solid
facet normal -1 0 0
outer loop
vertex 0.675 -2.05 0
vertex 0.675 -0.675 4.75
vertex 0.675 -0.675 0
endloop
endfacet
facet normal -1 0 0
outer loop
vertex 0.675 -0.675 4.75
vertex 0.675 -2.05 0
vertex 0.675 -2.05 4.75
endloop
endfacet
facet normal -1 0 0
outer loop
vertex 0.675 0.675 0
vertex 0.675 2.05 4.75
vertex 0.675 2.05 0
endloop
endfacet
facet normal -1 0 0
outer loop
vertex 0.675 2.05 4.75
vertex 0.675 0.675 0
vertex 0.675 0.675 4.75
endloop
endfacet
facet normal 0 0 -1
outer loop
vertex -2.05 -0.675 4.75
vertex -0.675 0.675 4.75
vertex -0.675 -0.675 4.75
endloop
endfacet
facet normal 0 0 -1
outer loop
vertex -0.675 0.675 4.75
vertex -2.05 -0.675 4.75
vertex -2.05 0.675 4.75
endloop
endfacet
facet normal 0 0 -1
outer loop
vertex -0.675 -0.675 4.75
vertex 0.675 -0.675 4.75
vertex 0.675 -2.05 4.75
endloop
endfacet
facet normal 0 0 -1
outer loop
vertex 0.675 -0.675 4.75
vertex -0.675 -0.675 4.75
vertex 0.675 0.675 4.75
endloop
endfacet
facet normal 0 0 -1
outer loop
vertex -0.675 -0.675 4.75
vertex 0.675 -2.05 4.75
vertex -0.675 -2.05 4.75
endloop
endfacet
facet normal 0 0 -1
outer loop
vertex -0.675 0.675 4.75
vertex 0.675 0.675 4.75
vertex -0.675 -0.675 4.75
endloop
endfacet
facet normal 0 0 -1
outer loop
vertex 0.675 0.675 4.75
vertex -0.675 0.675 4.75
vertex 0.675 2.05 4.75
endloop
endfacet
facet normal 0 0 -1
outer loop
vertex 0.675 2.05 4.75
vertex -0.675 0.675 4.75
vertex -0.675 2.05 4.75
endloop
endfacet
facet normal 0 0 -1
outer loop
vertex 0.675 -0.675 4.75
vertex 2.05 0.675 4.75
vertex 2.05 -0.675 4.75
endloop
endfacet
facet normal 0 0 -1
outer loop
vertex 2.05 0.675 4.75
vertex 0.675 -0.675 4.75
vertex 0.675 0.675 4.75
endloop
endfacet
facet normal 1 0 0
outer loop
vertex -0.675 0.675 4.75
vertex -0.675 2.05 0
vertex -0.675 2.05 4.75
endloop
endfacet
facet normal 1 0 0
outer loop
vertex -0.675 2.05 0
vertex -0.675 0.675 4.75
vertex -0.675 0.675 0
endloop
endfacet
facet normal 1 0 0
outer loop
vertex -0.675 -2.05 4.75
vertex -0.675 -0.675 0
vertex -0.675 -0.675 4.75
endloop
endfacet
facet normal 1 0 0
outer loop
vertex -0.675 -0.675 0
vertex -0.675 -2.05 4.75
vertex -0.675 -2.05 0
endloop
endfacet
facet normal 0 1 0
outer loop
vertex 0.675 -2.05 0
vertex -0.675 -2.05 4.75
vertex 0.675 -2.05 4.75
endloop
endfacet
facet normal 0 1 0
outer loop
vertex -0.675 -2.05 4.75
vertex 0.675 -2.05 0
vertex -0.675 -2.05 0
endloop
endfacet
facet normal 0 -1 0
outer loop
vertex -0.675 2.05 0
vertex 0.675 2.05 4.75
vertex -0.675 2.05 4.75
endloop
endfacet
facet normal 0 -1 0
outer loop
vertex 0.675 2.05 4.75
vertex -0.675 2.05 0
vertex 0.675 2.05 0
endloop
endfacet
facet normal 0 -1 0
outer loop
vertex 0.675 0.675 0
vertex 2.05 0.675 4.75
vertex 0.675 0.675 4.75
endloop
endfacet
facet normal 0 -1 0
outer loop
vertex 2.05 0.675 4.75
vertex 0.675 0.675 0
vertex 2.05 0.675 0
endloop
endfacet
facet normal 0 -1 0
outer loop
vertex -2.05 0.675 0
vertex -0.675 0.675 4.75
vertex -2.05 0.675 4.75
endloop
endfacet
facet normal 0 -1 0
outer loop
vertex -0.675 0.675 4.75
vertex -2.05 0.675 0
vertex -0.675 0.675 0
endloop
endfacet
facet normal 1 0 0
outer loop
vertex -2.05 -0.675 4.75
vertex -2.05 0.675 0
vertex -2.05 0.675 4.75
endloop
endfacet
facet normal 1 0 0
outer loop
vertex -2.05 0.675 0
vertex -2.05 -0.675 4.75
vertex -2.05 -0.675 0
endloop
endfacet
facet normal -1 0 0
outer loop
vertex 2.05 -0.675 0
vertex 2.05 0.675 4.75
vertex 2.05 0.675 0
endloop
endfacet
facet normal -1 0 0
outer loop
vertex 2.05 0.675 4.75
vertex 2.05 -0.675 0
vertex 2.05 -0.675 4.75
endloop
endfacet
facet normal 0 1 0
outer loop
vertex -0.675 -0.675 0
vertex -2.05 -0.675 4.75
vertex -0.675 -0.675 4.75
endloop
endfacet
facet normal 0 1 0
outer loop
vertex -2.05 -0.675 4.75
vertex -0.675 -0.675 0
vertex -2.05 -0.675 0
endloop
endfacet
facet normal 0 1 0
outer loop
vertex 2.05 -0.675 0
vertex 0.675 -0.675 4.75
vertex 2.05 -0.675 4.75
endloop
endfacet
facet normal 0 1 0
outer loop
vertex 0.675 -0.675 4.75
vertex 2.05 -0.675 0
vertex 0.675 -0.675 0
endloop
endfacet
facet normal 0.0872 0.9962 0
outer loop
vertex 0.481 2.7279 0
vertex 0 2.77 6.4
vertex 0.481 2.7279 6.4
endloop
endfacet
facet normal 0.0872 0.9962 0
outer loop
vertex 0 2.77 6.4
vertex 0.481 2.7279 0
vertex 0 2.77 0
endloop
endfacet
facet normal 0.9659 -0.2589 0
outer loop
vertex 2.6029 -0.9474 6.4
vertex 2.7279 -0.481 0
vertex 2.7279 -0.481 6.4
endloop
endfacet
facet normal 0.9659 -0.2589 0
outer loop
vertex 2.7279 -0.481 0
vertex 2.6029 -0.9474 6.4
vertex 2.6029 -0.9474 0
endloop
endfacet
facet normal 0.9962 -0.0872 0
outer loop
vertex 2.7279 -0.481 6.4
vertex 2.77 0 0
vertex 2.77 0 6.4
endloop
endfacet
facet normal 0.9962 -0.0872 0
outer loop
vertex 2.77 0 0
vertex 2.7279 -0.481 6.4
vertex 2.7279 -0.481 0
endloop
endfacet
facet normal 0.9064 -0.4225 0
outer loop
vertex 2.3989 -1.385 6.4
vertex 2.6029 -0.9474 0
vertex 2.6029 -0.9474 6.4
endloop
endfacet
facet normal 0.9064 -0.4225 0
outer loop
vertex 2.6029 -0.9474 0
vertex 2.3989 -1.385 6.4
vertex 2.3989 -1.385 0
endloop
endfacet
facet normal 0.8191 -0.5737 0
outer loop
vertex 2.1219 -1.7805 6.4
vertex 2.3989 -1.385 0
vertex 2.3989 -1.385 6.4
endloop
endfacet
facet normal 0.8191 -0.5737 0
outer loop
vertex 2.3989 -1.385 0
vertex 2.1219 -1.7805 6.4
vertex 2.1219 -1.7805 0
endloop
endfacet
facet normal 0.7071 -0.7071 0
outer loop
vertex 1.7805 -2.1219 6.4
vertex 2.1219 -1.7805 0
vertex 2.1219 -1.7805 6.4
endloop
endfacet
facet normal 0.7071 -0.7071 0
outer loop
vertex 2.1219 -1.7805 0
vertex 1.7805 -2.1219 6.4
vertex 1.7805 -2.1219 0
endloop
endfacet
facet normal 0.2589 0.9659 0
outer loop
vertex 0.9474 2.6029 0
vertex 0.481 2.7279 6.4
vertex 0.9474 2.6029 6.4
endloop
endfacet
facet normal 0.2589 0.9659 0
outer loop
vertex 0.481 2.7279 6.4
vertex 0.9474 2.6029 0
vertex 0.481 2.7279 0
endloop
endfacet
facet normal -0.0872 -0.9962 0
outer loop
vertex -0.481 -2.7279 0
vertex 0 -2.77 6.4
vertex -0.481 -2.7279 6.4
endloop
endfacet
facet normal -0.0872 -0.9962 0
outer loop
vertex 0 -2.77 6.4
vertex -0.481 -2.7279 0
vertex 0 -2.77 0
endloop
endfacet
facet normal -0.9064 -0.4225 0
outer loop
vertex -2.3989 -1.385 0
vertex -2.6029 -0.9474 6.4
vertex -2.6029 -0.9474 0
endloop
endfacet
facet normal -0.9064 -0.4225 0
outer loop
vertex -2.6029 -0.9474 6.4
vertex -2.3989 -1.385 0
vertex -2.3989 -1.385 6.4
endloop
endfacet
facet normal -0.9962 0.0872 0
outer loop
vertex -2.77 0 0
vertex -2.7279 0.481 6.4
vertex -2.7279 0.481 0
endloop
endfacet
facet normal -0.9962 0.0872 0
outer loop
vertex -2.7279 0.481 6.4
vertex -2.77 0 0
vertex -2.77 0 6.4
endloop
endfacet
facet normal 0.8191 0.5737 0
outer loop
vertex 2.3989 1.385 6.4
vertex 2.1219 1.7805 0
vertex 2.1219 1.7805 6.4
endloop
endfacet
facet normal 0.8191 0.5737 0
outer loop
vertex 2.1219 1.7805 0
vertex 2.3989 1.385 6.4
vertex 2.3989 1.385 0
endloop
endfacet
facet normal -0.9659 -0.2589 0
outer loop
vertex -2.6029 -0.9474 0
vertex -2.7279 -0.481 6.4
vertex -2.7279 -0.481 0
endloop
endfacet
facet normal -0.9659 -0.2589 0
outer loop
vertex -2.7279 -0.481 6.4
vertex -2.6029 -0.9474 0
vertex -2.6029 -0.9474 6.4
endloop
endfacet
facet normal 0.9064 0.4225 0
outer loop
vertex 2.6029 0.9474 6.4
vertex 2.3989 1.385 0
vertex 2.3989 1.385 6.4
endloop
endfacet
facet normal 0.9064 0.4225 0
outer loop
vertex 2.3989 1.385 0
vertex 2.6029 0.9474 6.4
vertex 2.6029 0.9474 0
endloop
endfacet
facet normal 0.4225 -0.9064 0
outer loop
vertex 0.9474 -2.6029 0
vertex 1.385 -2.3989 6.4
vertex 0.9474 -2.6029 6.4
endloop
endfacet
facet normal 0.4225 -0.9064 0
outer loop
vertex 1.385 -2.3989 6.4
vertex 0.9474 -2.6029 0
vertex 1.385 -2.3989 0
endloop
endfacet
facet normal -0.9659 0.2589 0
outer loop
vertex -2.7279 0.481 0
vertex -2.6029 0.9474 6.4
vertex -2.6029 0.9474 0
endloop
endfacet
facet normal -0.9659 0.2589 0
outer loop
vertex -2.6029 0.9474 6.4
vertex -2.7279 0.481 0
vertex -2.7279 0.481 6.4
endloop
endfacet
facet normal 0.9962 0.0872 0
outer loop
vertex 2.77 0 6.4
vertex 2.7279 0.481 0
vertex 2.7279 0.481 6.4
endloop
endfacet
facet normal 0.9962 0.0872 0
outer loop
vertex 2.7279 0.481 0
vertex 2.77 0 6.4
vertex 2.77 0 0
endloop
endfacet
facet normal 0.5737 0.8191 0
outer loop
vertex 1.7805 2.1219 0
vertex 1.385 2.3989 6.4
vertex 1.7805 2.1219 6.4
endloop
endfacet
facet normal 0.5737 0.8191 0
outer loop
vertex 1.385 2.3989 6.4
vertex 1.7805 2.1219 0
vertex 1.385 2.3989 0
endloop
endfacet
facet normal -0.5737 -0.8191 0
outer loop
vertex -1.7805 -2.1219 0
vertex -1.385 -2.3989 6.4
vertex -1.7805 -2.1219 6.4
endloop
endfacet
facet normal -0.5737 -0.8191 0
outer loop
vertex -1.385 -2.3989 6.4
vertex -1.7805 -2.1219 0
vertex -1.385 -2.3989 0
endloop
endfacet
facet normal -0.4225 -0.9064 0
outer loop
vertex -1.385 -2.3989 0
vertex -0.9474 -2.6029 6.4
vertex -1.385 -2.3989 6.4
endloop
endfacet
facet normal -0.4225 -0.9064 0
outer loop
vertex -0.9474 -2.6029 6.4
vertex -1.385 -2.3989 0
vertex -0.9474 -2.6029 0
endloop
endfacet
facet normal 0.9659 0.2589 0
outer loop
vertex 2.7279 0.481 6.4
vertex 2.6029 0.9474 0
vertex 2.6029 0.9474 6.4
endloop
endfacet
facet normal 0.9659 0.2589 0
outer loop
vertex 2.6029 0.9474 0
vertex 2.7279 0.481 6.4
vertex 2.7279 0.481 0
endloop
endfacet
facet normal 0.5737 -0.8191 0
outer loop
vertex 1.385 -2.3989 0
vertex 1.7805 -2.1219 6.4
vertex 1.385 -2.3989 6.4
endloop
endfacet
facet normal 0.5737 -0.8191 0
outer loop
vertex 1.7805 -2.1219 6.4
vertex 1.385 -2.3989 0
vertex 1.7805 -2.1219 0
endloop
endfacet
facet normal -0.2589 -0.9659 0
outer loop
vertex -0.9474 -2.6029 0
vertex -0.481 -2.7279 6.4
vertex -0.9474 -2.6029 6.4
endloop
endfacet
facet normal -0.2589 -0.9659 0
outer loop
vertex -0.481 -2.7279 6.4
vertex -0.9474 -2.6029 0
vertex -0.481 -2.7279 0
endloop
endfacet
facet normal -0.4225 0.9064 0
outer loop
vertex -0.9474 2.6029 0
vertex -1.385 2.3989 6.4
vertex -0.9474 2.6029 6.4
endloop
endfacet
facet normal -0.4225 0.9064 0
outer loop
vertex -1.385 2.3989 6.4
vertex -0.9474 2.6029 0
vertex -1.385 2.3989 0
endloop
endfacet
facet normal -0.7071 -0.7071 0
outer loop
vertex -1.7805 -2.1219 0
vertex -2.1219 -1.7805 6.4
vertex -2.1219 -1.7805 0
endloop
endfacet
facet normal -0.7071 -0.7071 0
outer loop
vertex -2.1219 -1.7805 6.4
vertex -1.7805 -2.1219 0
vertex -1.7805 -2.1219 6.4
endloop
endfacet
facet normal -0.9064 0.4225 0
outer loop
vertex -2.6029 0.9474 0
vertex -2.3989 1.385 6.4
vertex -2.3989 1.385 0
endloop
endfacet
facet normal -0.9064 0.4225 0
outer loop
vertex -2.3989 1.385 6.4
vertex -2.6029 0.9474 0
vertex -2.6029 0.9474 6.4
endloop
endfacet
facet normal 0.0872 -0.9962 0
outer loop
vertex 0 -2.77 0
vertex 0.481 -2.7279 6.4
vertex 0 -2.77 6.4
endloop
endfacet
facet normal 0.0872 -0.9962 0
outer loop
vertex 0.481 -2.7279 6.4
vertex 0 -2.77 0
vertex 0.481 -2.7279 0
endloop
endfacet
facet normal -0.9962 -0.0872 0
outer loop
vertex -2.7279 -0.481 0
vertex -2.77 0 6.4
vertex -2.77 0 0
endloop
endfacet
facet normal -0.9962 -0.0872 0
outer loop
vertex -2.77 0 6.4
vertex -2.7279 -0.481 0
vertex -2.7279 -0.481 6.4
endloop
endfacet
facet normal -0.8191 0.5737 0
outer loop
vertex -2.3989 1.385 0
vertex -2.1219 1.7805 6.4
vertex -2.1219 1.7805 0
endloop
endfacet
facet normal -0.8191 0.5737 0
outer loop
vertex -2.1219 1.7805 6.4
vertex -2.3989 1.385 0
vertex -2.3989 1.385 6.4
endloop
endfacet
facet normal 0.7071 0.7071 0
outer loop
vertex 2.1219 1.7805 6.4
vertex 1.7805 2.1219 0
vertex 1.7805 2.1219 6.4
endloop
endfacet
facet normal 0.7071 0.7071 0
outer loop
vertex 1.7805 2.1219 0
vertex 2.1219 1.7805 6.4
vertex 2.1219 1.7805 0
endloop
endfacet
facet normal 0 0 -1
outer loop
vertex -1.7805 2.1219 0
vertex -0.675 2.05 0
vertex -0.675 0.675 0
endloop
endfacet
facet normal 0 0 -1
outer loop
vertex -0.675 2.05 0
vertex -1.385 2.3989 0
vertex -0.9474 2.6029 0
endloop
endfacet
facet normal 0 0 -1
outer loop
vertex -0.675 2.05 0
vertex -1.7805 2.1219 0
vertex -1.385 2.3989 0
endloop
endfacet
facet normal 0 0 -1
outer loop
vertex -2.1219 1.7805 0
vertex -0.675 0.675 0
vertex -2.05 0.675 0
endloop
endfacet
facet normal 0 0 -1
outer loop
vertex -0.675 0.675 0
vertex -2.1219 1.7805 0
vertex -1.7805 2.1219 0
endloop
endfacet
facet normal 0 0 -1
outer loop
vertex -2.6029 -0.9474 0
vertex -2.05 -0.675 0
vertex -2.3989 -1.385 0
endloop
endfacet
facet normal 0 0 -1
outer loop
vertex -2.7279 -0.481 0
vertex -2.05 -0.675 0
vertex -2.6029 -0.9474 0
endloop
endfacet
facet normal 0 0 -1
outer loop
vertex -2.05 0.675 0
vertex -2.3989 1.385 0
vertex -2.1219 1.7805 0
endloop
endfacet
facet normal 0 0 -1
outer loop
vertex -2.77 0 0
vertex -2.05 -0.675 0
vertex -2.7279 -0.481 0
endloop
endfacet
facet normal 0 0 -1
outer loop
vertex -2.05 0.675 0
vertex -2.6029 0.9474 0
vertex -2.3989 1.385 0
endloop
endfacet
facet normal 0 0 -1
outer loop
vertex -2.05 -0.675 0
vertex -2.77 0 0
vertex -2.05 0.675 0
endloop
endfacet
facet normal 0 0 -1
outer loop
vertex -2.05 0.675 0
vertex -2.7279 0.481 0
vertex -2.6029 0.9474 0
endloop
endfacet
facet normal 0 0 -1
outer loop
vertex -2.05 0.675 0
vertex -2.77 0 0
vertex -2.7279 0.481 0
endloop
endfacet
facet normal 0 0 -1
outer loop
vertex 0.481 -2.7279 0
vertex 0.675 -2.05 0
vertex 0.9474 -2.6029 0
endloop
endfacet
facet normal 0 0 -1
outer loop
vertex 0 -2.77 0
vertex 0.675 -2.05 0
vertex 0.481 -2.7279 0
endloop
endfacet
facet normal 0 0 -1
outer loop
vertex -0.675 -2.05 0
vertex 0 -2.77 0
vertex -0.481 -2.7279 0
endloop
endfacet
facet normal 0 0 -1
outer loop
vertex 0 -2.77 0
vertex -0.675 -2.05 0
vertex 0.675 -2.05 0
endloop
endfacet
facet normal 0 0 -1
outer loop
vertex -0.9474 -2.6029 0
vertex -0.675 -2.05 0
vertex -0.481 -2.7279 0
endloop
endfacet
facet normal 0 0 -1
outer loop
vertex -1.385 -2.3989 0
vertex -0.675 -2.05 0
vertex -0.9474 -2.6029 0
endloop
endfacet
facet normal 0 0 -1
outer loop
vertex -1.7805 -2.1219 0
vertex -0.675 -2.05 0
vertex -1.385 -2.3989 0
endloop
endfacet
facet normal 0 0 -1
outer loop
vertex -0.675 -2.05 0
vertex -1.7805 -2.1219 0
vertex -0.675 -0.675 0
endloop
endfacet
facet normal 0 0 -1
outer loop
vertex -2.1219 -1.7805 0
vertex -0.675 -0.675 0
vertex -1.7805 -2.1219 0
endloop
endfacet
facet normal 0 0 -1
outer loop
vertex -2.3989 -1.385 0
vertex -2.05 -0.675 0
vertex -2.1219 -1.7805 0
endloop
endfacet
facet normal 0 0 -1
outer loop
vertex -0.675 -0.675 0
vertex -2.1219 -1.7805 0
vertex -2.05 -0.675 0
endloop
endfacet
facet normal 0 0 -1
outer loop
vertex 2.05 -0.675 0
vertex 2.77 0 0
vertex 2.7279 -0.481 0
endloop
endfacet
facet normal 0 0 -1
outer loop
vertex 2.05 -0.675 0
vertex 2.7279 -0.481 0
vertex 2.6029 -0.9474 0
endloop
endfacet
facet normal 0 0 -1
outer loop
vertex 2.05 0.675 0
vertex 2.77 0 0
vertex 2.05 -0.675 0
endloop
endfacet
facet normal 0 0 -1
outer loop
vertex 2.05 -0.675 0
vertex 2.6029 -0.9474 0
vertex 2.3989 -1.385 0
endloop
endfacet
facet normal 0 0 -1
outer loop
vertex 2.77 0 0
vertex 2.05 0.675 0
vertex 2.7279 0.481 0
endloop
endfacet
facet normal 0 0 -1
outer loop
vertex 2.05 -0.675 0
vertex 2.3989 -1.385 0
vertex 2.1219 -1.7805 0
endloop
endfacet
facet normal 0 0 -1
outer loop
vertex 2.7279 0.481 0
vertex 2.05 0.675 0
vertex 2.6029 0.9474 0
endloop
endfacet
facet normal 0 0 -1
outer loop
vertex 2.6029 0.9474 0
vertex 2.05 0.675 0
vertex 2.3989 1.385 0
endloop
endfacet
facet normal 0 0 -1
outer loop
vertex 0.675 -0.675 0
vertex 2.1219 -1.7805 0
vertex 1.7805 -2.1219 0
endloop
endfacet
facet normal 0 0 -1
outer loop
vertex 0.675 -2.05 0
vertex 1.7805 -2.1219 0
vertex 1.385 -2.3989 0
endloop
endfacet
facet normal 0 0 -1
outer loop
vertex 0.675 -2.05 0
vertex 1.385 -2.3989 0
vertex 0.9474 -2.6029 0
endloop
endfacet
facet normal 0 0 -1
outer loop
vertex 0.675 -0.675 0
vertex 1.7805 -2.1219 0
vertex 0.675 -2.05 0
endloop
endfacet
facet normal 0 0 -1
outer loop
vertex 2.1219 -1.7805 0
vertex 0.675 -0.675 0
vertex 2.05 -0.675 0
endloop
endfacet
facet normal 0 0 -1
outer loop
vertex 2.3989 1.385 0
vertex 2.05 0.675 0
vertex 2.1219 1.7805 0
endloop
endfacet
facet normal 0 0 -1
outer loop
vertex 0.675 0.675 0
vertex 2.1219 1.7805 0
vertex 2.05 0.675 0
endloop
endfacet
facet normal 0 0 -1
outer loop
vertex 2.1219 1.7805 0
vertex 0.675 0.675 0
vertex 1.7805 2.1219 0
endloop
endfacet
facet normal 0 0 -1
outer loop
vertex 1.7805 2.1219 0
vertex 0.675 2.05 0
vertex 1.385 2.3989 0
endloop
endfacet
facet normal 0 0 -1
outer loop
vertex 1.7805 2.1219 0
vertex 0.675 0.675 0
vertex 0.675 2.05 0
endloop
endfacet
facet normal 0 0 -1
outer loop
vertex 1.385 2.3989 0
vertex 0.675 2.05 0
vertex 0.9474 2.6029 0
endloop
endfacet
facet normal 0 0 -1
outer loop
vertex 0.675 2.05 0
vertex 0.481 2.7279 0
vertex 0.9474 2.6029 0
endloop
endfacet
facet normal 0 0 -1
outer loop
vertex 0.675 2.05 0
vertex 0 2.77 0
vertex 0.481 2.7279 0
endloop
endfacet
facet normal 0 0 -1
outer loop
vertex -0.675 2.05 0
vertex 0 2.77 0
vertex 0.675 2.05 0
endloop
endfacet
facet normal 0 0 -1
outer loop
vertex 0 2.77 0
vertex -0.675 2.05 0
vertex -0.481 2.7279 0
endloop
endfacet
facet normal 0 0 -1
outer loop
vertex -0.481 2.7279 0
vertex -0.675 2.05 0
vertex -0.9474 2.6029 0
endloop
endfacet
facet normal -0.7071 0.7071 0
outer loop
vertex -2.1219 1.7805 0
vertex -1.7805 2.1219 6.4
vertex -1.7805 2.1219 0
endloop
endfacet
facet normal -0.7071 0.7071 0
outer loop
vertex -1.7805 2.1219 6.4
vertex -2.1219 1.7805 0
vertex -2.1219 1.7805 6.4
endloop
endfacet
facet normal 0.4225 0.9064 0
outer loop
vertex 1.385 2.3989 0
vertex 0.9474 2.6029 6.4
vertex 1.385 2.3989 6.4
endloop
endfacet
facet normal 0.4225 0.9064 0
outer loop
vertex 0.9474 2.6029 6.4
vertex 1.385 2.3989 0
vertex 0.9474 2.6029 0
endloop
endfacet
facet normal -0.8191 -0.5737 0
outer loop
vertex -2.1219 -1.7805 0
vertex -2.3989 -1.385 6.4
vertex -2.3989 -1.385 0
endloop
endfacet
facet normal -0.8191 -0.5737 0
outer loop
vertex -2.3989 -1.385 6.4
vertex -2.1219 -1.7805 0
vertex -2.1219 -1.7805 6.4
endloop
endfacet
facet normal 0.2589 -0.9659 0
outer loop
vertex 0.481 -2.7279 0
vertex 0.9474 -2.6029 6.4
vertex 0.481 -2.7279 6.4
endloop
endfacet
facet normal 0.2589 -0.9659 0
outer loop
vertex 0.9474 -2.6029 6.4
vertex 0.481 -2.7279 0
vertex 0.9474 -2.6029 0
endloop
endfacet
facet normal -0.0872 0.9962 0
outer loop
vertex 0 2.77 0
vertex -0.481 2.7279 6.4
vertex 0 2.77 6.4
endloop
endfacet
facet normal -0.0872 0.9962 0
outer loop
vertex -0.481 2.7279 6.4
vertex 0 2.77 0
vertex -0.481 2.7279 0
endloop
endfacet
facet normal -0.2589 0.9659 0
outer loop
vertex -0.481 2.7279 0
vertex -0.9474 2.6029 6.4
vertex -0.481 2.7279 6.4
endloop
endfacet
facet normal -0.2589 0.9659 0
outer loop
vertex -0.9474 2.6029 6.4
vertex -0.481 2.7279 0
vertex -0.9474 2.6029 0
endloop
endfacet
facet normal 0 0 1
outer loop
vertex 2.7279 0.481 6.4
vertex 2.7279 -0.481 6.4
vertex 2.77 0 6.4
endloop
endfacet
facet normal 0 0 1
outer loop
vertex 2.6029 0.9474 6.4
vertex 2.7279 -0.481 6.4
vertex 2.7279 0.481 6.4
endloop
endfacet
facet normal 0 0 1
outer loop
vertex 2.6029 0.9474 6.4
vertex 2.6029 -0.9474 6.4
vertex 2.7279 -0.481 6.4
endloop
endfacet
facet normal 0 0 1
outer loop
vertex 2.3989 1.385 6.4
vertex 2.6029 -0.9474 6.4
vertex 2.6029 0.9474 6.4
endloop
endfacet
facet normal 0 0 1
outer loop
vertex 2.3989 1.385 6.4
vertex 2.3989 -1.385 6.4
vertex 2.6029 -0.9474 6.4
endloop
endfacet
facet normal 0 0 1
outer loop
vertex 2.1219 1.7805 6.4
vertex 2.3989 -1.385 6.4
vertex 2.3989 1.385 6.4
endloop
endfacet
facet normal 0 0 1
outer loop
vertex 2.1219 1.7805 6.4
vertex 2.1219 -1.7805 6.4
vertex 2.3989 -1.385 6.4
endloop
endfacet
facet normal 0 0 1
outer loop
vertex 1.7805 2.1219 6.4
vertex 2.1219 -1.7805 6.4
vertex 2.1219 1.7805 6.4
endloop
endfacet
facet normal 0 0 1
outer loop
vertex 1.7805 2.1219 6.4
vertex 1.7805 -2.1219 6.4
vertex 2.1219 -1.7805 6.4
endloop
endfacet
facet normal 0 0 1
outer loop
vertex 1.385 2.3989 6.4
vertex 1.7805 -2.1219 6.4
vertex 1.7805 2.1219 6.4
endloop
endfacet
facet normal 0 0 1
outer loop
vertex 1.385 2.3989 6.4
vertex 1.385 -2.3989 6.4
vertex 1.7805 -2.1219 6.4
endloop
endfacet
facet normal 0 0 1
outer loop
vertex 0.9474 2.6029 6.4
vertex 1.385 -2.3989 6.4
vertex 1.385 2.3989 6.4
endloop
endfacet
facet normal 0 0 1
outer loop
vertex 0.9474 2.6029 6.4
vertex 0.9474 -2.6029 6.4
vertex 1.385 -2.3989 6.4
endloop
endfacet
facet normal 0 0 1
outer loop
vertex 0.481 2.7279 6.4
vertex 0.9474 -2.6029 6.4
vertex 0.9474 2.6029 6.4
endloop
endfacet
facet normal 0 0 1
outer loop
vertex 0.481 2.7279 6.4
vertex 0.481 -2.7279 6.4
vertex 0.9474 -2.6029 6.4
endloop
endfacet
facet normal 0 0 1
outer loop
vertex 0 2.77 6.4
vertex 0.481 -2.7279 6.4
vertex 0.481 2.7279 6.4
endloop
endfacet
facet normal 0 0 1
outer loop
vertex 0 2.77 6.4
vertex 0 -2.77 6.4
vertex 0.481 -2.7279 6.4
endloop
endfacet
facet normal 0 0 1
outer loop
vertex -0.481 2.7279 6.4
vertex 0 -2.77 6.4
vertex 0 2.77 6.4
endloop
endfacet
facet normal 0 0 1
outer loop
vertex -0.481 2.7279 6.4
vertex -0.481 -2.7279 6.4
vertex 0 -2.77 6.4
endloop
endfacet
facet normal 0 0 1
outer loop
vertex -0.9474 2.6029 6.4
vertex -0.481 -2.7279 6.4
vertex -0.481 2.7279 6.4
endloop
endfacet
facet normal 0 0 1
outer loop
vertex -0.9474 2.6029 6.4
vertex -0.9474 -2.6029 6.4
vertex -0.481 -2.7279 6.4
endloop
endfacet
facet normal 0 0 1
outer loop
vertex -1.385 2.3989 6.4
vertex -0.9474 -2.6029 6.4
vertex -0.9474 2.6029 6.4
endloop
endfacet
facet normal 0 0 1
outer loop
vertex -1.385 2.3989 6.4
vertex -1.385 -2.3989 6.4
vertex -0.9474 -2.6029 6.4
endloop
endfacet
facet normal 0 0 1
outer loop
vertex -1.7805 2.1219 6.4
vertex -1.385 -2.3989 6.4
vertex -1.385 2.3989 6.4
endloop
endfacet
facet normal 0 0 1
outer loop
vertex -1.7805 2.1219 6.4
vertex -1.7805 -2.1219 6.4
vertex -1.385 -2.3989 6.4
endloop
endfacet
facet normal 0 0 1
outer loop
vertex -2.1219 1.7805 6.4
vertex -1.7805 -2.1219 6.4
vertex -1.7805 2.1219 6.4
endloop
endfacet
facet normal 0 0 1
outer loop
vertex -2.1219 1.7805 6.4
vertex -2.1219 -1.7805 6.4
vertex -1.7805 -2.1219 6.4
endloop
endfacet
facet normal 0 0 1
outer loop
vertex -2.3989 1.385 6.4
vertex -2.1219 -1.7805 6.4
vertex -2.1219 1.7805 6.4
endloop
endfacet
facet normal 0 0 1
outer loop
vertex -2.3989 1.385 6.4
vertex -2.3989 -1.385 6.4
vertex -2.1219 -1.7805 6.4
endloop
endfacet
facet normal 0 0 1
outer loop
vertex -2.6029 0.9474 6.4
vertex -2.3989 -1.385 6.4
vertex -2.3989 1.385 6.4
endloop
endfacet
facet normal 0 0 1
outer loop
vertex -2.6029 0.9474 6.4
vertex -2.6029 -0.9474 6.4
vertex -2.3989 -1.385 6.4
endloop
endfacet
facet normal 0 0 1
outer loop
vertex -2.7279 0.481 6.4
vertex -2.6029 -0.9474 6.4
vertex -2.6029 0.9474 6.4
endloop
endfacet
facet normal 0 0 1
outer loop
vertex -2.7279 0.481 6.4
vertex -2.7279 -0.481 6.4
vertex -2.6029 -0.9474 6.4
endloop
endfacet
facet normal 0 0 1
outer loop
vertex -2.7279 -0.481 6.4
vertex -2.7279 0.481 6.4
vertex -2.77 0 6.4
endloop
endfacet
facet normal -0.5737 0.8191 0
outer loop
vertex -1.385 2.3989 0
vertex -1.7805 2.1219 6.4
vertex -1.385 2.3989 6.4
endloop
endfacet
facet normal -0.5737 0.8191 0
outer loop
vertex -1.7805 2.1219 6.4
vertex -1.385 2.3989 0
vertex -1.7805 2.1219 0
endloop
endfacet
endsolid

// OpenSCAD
module keystem() {
totalheight=6.4;
depthofcross=4.5;
translationofcross = totalheight-0.5*depthofcross;

rotate([180,0,0]) translate([0,0,-totalheight]) difference(){ //stemofkeycap
    
    
    cylinder(h=totalheight,r=5.54/2,$fn=36);
    union(){
        translate([0,0,translationofcross]) cube([1.35,4.10,depthofcross+0.5], center=true);
        translate([0,0,translationofcross]) rotate([0,0,90]) cube([1.35,4.10,depthofcross+0.5], center=true);
    }
}};

keystem() ;
